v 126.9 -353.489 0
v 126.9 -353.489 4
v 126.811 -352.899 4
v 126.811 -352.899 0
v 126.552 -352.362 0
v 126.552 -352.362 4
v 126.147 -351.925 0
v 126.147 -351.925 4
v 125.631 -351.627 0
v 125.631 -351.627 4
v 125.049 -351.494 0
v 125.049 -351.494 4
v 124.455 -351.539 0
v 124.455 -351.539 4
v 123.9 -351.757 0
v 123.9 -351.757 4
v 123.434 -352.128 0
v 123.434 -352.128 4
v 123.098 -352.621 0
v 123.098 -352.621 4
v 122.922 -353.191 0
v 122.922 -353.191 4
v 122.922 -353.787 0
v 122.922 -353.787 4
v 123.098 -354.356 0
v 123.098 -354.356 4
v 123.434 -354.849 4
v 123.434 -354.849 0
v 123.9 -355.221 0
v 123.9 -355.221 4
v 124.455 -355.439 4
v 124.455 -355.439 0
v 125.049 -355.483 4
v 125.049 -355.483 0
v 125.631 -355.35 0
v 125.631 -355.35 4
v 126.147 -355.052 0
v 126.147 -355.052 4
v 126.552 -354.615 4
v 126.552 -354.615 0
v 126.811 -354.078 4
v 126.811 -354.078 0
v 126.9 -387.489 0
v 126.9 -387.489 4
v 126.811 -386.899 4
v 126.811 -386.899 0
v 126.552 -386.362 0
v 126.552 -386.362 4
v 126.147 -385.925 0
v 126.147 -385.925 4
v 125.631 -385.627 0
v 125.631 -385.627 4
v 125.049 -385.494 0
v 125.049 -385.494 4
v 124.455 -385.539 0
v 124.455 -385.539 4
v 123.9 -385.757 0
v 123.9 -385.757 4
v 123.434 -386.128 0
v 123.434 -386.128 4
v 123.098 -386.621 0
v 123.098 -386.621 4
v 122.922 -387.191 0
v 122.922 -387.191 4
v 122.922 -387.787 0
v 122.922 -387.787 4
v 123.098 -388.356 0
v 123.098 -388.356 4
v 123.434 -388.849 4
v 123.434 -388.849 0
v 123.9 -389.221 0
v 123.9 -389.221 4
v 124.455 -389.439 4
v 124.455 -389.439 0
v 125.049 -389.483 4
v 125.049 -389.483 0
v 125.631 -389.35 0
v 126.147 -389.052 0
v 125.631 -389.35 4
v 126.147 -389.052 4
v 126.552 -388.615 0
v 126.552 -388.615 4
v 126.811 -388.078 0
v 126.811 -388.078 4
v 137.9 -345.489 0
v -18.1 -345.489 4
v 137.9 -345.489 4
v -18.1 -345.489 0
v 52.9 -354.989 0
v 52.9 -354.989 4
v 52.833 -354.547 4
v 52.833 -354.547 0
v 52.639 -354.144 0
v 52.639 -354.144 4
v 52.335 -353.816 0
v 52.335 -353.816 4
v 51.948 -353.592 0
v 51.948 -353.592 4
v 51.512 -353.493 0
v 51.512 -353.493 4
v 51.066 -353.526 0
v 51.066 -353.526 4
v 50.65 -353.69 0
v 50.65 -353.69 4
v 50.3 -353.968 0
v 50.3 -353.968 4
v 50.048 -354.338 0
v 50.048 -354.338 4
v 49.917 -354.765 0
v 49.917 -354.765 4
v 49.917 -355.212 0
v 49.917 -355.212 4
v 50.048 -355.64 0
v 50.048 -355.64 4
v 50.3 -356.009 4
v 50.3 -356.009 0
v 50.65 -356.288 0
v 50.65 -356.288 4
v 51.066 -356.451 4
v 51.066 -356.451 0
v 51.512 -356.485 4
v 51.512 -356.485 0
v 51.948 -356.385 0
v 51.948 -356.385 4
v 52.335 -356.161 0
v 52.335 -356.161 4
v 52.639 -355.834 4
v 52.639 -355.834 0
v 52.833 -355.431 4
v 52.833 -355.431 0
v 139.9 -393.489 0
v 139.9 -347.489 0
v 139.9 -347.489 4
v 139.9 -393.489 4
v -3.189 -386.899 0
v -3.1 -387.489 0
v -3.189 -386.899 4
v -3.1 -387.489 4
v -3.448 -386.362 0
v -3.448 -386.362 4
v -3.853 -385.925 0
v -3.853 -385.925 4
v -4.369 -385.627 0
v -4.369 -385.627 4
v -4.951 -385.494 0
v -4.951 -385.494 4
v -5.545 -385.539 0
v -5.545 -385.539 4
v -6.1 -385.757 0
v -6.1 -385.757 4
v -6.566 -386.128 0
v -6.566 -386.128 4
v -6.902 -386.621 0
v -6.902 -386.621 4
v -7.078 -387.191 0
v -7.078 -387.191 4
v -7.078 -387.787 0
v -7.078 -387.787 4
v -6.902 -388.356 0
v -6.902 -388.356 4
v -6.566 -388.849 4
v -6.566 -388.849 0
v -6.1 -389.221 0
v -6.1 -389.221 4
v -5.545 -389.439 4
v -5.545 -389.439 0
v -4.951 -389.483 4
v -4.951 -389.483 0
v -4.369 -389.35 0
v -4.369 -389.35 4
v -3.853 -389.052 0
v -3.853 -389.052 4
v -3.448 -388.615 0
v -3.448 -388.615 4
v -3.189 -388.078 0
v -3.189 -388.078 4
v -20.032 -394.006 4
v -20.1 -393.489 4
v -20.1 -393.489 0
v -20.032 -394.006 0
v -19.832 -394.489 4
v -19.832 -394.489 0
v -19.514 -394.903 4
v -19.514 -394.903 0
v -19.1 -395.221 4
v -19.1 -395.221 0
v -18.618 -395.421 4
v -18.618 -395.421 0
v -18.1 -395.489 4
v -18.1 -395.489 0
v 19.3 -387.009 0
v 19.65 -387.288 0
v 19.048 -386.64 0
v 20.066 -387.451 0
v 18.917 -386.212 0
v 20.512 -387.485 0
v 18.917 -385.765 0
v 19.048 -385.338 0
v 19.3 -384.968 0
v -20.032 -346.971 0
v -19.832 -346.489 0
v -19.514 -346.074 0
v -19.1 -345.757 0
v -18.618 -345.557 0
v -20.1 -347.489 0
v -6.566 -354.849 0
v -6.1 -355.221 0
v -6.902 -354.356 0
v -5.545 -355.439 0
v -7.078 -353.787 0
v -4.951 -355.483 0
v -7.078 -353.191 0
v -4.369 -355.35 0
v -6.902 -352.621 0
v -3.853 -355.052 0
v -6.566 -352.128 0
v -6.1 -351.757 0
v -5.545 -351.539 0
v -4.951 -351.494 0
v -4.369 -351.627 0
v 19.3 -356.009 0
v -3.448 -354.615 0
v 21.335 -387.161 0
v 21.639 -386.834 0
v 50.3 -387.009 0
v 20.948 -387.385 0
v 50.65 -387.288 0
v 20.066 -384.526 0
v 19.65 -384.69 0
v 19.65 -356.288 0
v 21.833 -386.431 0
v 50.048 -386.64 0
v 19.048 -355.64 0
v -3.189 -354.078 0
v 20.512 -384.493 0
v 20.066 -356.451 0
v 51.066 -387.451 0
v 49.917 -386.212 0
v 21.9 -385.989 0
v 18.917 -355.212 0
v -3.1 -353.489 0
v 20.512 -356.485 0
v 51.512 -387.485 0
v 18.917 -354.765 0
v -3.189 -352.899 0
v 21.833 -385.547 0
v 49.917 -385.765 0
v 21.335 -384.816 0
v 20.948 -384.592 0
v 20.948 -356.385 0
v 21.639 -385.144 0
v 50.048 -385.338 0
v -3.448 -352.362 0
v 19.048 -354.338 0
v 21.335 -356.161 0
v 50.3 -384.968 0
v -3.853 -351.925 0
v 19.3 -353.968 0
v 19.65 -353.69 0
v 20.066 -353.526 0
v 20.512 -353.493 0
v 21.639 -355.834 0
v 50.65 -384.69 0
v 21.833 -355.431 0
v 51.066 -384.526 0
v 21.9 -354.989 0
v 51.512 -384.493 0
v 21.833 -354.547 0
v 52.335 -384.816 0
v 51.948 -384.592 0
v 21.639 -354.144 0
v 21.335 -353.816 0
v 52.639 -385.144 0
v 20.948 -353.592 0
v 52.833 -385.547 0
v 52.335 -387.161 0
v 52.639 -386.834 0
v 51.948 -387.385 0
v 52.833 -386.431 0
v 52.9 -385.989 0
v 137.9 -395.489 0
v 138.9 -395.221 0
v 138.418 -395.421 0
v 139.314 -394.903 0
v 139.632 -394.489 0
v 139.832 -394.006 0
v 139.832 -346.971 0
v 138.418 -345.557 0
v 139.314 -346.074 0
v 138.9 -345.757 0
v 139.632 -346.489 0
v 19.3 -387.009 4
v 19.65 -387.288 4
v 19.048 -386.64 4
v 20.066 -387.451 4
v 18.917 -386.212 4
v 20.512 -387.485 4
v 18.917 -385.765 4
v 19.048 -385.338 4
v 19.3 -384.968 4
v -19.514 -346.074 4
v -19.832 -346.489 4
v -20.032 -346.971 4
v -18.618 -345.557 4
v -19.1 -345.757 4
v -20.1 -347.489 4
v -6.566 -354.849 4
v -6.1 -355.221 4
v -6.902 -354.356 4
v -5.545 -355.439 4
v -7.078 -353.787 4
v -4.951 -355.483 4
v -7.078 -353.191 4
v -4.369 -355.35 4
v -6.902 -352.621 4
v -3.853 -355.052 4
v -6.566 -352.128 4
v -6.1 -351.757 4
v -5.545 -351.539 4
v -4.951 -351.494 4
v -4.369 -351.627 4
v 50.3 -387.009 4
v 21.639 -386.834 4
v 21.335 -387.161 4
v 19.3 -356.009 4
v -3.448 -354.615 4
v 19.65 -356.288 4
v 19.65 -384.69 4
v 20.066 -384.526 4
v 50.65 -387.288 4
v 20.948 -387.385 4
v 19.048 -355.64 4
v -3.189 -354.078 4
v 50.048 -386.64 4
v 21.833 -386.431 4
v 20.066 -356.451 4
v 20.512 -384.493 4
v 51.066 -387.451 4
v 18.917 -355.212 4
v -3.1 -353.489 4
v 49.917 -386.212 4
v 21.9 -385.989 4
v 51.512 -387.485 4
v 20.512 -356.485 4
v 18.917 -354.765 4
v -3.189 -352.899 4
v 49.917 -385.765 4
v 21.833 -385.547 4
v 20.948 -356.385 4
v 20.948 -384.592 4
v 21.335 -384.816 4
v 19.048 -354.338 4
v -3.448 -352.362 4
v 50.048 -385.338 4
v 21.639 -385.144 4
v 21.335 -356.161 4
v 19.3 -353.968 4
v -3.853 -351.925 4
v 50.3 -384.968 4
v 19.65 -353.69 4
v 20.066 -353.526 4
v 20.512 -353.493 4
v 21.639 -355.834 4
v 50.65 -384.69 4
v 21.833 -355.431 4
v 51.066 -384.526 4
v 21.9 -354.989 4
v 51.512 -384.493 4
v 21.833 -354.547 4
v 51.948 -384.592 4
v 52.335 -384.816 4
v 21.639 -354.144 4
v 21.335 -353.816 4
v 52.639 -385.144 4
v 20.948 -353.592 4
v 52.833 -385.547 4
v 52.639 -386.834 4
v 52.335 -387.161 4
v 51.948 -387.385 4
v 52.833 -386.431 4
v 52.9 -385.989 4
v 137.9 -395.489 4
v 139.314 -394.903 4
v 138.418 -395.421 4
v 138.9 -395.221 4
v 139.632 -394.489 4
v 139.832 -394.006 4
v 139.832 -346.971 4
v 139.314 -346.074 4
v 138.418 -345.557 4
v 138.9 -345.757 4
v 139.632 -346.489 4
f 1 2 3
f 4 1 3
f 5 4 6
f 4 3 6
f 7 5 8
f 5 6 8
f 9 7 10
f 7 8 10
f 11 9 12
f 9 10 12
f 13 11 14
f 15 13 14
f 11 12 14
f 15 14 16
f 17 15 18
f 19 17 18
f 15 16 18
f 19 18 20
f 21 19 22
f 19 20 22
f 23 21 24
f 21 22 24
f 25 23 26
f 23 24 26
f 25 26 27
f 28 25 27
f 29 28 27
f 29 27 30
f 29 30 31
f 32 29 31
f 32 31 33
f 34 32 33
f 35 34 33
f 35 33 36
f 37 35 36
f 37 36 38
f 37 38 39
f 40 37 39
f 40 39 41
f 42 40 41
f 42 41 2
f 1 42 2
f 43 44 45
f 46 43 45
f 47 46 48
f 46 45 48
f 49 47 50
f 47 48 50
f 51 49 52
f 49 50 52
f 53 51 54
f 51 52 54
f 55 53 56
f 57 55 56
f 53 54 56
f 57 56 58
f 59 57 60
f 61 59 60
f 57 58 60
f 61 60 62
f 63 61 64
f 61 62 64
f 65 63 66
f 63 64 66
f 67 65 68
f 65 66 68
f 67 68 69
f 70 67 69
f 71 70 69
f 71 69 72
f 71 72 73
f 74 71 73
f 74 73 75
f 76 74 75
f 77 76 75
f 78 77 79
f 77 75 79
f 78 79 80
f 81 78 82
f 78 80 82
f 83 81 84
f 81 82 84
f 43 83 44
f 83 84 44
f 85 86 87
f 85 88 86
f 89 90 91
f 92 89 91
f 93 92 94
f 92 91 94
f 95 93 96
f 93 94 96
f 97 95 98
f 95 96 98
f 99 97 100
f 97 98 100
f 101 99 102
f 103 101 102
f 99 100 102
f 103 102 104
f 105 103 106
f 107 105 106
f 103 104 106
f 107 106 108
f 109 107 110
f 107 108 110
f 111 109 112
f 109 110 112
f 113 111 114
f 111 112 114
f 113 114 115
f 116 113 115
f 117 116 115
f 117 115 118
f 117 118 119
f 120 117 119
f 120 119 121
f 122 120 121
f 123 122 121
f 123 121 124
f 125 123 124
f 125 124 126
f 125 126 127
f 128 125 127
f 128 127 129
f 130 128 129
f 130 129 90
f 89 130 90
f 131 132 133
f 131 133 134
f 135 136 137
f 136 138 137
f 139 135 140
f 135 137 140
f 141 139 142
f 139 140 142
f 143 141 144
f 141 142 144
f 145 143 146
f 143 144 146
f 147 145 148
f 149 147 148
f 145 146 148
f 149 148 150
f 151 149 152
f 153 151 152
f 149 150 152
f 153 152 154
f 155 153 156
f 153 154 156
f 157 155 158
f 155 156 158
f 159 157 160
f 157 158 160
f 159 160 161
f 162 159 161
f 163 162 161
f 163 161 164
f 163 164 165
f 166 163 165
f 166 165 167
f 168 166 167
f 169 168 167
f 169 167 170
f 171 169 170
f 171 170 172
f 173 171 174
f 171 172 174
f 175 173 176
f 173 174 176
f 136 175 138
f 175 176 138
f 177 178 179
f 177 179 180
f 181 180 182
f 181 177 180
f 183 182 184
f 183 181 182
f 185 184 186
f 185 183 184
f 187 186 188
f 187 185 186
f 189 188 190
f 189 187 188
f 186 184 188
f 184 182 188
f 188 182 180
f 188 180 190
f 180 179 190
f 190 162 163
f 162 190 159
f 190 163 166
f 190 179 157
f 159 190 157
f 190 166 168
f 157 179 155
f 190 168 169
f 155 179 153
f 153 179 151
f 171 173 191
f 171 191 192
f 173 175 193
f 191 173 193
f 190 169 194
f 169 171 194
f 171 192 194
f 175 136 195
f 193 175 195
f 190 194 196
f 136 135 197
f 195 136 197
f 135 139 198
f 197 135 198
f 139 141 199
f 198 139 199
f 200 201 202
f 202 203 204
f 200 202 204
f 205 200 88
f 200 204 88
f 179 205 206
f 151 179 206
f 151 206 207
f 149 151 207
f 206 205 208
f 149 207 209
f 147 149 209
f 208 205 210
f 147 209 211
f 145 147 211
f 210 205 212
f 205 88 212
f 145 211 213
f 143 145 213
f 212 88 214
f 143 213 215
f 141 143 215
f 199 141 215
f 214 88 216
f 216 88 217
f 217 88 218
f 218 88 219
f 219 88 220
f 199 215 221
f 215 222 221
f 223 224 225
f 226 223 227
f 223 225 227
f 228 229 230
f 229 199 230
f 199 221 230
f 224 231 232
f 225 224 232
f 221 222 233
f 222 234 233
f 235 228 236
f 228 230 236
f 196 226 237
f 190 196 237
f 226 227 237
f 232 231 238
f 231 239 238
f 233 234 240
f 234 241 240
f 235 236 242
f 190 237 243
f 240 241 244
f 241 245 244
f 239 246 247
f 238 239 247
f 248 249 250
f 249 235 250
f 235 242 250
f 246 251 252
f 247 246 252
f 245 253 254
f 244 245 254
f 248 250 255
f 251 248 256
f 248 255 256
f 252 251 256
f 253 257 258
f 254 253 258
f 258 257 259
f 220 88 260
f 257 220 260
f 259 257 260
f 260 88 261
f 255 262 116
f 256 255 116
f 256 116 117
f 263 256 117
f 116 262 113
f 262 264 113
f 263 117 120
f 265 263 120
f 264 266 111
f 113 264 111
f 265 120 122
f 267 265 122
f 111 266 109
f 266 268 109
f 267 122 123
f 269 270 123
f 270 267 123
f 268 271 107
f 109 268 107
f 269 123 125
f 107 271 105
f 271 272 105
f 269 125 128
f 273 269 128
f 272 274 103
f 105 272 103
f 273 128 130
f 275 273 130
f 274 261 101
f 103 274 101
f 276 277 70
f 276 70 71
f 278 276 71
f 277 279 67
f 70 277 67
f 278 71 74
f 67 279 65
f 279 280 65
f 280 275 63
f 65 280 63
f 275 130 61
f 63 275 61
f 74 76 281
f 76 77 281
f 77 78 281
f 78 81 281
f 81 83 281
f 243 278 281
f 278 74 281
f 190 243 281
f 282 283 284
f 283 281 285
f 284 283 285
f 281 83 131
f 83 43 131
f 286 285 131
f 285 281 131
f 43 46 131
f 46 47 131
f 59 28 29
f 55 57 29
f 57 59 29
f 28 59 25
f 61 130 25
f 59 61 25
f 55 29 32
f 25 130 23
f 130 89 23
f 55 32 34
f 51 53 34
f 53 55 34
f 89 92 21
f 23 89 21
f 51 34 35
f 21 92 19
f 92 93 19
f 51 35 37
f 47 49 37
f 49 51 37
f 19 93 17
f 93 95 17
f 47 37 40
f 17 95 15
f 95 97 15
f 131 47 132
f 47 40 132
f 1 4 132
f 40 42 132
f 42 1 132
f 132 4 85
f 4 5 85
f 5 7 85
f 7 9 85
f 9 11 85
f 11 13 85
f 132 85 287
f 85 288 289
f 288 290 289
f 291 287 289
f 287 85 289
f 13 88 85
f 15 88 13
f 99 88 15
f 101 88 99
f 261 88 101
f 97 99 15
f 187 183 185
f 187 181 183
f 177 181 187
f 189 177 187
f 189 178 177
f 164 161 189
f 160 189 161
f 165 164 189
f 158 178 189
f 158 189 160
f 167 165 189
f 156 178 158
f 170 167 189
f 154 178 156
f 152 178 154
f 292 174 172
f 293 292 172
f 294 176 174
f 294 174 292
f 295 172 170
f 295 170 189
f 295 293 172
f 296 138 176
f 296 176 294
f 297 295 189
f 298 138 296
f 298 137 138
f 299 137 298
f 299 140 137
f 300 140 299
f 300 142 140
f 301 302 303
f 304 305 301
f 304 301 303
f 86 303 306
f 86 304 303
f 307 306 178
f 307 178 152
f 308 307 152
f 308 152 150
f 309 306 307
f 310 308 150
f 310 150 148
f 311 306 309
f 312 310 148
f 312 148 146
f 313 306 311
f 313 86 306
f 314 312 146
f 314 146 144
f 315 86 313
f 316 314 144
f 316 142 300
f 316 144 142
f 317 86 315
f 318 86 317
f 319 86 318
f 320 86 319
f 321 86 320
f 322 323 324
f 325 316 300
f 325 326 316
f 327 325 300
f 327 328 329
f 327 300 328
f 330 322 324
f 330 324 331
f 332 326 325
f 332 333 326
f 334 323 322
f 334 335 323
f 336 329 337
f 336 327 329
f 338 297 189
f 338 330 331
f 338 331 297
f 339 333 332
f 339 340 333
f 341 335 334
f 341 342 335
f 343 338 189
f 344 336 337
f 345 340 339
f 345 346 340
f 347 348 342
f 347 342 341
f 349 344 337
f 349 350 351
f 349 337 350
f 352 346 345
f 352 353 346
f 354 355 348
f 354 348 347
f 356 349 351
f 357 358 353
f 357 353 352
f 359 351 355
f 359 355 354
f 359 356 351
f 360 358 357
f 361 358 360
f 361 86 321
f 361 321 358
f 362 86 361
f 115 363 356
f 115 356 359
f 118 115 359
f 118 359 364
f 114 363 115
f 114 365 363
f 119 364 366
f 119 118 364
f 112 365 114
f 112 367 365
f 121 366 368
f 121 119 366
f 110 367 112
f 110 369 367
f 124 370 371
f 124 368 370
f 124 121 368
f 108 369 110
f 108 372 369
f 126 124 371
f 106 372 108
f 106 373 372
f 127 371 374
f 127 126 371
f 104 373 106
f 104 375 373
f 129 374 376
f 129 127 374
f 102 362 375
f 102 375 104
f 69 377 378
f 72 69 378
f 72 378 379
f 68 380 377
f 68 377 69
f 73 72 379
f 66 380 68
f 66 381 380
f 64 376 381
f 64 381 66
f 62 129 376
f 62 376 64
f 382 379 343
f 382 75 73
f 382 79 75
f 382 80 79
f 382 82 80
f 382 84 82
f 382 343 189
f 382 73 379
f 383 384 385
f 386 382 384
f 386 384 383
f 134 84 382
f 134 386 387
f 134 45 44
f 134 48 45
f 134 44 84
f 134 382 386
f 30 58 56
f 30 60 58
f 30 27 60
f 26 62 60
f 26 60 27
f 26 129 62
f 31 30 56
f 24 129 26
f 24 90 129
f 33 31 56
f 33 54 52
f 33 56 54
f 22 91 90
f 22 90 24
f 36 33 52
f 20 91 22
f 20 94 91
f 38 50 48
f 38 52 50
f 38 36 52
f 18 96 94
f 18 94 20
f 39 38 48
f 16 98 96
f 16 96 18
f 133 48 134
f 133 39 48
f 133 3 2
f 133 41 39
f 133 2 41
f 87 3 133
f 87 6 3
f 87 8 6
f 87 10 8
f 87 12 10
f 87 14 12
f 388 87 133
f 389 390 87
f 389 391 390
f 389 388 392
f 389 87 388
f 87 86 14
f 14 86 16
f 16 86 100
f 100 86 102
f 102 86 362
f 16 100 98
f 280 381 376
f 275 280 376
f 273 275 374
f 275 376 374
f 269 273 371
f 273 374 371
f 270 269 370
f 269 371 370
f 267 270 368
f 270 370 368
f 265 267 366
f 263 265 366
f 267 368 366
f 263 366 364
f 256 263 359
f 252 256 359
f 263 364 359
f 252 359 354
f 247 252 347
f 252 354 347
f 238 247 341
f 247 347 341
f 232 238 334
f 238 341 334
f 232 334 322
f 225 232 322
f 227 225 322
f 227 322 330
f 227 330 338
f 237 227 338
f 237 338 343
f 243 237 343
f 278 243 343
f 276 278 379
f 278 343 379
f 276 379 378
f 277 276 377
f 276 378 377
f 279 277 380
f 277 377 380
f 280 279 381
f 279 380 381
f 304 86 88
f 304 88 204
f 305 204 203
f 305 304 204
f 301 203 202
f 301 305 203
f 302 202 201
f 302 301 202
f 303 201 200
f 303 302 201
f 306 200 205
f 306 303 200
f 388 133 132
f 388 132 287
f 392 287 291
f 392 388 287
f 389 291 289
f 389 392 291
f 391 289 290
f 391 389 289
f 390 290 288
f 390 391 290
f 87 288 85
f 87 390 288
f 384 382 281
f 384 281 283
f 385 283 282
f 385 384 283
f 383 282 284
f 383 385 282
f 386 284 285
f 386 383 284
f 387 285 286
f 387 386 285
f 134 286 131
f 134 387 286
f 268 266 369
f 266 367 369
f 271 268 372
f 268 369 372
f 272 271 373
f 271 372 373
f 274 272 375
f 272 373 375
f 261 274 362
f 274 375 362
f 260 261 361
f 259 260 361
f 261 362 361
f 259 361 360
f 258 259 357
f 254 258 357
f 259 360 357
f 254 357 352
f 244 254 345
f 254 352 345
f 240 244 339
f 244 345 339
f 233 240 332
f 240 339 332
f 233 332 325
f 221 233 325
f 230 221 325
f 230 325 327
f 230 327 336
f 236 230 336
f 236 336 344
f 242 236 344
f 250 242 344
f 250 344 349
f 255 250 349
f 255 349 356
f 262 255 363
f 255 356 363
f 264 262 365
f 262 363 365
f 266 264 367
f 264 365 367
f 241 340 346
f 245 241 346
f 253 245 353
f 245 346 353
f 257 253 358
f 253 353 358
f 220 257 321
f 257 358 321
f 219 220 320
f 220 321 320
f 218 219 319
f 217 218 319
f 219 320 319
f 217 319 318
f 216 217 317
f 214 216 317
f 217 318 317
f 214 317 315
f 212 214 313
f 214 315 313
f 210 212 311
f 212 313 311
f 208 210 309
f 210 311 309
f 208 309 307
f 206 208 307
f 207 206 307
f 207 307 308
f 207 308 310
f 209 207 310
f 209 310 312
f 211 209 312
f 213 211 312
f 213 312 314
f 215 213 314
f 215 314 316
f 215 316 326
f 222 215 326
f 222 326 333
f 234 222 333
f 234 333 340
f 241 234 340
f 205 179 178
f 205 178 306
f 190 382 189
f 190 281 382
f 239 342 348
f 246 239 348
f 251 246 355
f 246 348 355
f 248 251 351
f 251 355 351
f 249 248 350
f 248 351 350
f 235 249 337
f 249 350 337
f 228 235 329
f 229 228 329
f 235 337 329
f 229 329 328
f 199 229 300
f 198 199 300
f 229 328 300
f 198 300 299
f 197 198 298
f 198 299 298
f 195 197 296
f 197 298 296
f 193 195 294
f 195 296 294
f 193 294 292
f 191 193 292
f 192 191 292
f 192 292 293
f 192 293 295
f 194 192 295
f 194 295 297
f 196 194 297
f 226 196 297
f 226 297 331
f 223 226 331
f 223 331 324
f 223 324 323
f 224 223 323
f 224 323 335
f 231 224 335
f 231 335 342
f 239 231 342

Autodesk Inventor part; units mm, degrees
ref_plane "YZ Plane" through (0, 0, 0) normal (1, 0, 0) x (0, 1, 0)
ref_plane "XZ Plane" through (0, 0, 0) normal (0, 1, 0) x (-1, 0, 0)
ref_plane "XY Plane" through (0, 0, 0) normal (0, 0, 1) x (1, 0, 0)
sketch "Sketch1" plane through (0, 0, 0) normal (0, 0, 1) x (1, 0, 0)
  line L0 (139.9, -900) -> (139.9, 100) construction
  line L1 (-20.1001, -2.6887) -> (-20.0999, -902.6887) construction
  line L2 (139.9, -395.4887) -> (-20.1, -395.4887)
  line L3 (-20.1, -395.4887) -> (-20.1, -345.4887)
  line L4 (-20.1, -345.4887) -> (139.9, -345.4887)
  line L5 (139.9, -345.4887) -> (139.9, -395.4887)
  point P0 (0, 0)
  dimension "d0" = 50
extrude "Extrusion1" add sketch "Sketch1" along normal blind 4
fillet "Fillet1" radius 2 4 edges at (-20.1, -395.4887, 2) (-20.1, -345.4887, 2) (139.9, -395.4887, 2) (139.9, -345.4887, 2)
sketch "Sketch2" plane through (0, 0, 4) normal (0, 0, 1) x (1, 0, 0)
  line L0 (128.9999, 97.3113) -> (129.0001, -902.6887) construction
  line L1 (120.7999, 97.3113) -> (128.9999, 97.3113) construction
  line L2 (120.7999, 97.3113) -> (120.8001, -902.6887) construction
  line L3 (129.0001, -902.6887) -> (120.8001, -902.6887) construction
  line L4 (-1.0001, 97.3113) -> (-0.9999, -902.6887) construction
  line L5 (-9.2001, 97.3113) -> (-1.0001, 97.3113) construction
  line L6 (-9.2001, 97.3113) -> (-9.1999, -902.6887) construction
  line L7 (-0.9999, -902.6887) -> (-9.1999, -902.6887) construction
  line L8 (124.9001, -902.6887) -> (124.8999, 97.3113) construction
  line L9 (-5.1001, 97.3113) -> (-5.0999, -902.6887) construction
  circle A0 centre (51.3999, -385.9887) radius 1.5 construction
  circle A1 centre (20.3999, -385.9887) radius 1.5 construction
  circle A2 centre (20.3999, -354.9887) radius 1.5 construction
  circle A3 centre (51.3999, -354.9887) radius 1.5 construction
  circle A4 centre (124.9, -387.4887) radius 2
  circle A5 centre (124.9, -353.4887) radius 2
  circle A6 centre (51.3999, -385.9887) radius 1.5
  circle A7 centre (51.3999, -354.9887) radius 1.5
  circle A8 centre (20.3999, -354.9887) radius 1.5
  circle A9 centre (20.3999, -385.9887) radius 1.5
  circle A10 centre (-5.1, -387.4887) radius 2
  circle A11 centre (-5.1, -353.4887) radius 2
  line L10 (-18.1, -395.4887) -> (137.9, -395.4887) projected
  line L11 (137.9, -345.4887) -> (-18.1, -345.4887) projected
  point P0 (0, 0)
  dimension "d4" = 4
  dimension "d5" = 4
  dimension "d6" = 3
  dimension "d7" = 3
  dimension "d8" = 3
  dimension "d9" = 3
  dimension "d10" = 4
  dimension "d11" = 4
  dimension "d12" = 8
  dimension "d13" = 8
  dimension "d14" = 8
  dimension "d15" = 8
extrude "Extrusion2" cut sketch "Sketch2" against normal through all
properties part number "wiper motor holder"
